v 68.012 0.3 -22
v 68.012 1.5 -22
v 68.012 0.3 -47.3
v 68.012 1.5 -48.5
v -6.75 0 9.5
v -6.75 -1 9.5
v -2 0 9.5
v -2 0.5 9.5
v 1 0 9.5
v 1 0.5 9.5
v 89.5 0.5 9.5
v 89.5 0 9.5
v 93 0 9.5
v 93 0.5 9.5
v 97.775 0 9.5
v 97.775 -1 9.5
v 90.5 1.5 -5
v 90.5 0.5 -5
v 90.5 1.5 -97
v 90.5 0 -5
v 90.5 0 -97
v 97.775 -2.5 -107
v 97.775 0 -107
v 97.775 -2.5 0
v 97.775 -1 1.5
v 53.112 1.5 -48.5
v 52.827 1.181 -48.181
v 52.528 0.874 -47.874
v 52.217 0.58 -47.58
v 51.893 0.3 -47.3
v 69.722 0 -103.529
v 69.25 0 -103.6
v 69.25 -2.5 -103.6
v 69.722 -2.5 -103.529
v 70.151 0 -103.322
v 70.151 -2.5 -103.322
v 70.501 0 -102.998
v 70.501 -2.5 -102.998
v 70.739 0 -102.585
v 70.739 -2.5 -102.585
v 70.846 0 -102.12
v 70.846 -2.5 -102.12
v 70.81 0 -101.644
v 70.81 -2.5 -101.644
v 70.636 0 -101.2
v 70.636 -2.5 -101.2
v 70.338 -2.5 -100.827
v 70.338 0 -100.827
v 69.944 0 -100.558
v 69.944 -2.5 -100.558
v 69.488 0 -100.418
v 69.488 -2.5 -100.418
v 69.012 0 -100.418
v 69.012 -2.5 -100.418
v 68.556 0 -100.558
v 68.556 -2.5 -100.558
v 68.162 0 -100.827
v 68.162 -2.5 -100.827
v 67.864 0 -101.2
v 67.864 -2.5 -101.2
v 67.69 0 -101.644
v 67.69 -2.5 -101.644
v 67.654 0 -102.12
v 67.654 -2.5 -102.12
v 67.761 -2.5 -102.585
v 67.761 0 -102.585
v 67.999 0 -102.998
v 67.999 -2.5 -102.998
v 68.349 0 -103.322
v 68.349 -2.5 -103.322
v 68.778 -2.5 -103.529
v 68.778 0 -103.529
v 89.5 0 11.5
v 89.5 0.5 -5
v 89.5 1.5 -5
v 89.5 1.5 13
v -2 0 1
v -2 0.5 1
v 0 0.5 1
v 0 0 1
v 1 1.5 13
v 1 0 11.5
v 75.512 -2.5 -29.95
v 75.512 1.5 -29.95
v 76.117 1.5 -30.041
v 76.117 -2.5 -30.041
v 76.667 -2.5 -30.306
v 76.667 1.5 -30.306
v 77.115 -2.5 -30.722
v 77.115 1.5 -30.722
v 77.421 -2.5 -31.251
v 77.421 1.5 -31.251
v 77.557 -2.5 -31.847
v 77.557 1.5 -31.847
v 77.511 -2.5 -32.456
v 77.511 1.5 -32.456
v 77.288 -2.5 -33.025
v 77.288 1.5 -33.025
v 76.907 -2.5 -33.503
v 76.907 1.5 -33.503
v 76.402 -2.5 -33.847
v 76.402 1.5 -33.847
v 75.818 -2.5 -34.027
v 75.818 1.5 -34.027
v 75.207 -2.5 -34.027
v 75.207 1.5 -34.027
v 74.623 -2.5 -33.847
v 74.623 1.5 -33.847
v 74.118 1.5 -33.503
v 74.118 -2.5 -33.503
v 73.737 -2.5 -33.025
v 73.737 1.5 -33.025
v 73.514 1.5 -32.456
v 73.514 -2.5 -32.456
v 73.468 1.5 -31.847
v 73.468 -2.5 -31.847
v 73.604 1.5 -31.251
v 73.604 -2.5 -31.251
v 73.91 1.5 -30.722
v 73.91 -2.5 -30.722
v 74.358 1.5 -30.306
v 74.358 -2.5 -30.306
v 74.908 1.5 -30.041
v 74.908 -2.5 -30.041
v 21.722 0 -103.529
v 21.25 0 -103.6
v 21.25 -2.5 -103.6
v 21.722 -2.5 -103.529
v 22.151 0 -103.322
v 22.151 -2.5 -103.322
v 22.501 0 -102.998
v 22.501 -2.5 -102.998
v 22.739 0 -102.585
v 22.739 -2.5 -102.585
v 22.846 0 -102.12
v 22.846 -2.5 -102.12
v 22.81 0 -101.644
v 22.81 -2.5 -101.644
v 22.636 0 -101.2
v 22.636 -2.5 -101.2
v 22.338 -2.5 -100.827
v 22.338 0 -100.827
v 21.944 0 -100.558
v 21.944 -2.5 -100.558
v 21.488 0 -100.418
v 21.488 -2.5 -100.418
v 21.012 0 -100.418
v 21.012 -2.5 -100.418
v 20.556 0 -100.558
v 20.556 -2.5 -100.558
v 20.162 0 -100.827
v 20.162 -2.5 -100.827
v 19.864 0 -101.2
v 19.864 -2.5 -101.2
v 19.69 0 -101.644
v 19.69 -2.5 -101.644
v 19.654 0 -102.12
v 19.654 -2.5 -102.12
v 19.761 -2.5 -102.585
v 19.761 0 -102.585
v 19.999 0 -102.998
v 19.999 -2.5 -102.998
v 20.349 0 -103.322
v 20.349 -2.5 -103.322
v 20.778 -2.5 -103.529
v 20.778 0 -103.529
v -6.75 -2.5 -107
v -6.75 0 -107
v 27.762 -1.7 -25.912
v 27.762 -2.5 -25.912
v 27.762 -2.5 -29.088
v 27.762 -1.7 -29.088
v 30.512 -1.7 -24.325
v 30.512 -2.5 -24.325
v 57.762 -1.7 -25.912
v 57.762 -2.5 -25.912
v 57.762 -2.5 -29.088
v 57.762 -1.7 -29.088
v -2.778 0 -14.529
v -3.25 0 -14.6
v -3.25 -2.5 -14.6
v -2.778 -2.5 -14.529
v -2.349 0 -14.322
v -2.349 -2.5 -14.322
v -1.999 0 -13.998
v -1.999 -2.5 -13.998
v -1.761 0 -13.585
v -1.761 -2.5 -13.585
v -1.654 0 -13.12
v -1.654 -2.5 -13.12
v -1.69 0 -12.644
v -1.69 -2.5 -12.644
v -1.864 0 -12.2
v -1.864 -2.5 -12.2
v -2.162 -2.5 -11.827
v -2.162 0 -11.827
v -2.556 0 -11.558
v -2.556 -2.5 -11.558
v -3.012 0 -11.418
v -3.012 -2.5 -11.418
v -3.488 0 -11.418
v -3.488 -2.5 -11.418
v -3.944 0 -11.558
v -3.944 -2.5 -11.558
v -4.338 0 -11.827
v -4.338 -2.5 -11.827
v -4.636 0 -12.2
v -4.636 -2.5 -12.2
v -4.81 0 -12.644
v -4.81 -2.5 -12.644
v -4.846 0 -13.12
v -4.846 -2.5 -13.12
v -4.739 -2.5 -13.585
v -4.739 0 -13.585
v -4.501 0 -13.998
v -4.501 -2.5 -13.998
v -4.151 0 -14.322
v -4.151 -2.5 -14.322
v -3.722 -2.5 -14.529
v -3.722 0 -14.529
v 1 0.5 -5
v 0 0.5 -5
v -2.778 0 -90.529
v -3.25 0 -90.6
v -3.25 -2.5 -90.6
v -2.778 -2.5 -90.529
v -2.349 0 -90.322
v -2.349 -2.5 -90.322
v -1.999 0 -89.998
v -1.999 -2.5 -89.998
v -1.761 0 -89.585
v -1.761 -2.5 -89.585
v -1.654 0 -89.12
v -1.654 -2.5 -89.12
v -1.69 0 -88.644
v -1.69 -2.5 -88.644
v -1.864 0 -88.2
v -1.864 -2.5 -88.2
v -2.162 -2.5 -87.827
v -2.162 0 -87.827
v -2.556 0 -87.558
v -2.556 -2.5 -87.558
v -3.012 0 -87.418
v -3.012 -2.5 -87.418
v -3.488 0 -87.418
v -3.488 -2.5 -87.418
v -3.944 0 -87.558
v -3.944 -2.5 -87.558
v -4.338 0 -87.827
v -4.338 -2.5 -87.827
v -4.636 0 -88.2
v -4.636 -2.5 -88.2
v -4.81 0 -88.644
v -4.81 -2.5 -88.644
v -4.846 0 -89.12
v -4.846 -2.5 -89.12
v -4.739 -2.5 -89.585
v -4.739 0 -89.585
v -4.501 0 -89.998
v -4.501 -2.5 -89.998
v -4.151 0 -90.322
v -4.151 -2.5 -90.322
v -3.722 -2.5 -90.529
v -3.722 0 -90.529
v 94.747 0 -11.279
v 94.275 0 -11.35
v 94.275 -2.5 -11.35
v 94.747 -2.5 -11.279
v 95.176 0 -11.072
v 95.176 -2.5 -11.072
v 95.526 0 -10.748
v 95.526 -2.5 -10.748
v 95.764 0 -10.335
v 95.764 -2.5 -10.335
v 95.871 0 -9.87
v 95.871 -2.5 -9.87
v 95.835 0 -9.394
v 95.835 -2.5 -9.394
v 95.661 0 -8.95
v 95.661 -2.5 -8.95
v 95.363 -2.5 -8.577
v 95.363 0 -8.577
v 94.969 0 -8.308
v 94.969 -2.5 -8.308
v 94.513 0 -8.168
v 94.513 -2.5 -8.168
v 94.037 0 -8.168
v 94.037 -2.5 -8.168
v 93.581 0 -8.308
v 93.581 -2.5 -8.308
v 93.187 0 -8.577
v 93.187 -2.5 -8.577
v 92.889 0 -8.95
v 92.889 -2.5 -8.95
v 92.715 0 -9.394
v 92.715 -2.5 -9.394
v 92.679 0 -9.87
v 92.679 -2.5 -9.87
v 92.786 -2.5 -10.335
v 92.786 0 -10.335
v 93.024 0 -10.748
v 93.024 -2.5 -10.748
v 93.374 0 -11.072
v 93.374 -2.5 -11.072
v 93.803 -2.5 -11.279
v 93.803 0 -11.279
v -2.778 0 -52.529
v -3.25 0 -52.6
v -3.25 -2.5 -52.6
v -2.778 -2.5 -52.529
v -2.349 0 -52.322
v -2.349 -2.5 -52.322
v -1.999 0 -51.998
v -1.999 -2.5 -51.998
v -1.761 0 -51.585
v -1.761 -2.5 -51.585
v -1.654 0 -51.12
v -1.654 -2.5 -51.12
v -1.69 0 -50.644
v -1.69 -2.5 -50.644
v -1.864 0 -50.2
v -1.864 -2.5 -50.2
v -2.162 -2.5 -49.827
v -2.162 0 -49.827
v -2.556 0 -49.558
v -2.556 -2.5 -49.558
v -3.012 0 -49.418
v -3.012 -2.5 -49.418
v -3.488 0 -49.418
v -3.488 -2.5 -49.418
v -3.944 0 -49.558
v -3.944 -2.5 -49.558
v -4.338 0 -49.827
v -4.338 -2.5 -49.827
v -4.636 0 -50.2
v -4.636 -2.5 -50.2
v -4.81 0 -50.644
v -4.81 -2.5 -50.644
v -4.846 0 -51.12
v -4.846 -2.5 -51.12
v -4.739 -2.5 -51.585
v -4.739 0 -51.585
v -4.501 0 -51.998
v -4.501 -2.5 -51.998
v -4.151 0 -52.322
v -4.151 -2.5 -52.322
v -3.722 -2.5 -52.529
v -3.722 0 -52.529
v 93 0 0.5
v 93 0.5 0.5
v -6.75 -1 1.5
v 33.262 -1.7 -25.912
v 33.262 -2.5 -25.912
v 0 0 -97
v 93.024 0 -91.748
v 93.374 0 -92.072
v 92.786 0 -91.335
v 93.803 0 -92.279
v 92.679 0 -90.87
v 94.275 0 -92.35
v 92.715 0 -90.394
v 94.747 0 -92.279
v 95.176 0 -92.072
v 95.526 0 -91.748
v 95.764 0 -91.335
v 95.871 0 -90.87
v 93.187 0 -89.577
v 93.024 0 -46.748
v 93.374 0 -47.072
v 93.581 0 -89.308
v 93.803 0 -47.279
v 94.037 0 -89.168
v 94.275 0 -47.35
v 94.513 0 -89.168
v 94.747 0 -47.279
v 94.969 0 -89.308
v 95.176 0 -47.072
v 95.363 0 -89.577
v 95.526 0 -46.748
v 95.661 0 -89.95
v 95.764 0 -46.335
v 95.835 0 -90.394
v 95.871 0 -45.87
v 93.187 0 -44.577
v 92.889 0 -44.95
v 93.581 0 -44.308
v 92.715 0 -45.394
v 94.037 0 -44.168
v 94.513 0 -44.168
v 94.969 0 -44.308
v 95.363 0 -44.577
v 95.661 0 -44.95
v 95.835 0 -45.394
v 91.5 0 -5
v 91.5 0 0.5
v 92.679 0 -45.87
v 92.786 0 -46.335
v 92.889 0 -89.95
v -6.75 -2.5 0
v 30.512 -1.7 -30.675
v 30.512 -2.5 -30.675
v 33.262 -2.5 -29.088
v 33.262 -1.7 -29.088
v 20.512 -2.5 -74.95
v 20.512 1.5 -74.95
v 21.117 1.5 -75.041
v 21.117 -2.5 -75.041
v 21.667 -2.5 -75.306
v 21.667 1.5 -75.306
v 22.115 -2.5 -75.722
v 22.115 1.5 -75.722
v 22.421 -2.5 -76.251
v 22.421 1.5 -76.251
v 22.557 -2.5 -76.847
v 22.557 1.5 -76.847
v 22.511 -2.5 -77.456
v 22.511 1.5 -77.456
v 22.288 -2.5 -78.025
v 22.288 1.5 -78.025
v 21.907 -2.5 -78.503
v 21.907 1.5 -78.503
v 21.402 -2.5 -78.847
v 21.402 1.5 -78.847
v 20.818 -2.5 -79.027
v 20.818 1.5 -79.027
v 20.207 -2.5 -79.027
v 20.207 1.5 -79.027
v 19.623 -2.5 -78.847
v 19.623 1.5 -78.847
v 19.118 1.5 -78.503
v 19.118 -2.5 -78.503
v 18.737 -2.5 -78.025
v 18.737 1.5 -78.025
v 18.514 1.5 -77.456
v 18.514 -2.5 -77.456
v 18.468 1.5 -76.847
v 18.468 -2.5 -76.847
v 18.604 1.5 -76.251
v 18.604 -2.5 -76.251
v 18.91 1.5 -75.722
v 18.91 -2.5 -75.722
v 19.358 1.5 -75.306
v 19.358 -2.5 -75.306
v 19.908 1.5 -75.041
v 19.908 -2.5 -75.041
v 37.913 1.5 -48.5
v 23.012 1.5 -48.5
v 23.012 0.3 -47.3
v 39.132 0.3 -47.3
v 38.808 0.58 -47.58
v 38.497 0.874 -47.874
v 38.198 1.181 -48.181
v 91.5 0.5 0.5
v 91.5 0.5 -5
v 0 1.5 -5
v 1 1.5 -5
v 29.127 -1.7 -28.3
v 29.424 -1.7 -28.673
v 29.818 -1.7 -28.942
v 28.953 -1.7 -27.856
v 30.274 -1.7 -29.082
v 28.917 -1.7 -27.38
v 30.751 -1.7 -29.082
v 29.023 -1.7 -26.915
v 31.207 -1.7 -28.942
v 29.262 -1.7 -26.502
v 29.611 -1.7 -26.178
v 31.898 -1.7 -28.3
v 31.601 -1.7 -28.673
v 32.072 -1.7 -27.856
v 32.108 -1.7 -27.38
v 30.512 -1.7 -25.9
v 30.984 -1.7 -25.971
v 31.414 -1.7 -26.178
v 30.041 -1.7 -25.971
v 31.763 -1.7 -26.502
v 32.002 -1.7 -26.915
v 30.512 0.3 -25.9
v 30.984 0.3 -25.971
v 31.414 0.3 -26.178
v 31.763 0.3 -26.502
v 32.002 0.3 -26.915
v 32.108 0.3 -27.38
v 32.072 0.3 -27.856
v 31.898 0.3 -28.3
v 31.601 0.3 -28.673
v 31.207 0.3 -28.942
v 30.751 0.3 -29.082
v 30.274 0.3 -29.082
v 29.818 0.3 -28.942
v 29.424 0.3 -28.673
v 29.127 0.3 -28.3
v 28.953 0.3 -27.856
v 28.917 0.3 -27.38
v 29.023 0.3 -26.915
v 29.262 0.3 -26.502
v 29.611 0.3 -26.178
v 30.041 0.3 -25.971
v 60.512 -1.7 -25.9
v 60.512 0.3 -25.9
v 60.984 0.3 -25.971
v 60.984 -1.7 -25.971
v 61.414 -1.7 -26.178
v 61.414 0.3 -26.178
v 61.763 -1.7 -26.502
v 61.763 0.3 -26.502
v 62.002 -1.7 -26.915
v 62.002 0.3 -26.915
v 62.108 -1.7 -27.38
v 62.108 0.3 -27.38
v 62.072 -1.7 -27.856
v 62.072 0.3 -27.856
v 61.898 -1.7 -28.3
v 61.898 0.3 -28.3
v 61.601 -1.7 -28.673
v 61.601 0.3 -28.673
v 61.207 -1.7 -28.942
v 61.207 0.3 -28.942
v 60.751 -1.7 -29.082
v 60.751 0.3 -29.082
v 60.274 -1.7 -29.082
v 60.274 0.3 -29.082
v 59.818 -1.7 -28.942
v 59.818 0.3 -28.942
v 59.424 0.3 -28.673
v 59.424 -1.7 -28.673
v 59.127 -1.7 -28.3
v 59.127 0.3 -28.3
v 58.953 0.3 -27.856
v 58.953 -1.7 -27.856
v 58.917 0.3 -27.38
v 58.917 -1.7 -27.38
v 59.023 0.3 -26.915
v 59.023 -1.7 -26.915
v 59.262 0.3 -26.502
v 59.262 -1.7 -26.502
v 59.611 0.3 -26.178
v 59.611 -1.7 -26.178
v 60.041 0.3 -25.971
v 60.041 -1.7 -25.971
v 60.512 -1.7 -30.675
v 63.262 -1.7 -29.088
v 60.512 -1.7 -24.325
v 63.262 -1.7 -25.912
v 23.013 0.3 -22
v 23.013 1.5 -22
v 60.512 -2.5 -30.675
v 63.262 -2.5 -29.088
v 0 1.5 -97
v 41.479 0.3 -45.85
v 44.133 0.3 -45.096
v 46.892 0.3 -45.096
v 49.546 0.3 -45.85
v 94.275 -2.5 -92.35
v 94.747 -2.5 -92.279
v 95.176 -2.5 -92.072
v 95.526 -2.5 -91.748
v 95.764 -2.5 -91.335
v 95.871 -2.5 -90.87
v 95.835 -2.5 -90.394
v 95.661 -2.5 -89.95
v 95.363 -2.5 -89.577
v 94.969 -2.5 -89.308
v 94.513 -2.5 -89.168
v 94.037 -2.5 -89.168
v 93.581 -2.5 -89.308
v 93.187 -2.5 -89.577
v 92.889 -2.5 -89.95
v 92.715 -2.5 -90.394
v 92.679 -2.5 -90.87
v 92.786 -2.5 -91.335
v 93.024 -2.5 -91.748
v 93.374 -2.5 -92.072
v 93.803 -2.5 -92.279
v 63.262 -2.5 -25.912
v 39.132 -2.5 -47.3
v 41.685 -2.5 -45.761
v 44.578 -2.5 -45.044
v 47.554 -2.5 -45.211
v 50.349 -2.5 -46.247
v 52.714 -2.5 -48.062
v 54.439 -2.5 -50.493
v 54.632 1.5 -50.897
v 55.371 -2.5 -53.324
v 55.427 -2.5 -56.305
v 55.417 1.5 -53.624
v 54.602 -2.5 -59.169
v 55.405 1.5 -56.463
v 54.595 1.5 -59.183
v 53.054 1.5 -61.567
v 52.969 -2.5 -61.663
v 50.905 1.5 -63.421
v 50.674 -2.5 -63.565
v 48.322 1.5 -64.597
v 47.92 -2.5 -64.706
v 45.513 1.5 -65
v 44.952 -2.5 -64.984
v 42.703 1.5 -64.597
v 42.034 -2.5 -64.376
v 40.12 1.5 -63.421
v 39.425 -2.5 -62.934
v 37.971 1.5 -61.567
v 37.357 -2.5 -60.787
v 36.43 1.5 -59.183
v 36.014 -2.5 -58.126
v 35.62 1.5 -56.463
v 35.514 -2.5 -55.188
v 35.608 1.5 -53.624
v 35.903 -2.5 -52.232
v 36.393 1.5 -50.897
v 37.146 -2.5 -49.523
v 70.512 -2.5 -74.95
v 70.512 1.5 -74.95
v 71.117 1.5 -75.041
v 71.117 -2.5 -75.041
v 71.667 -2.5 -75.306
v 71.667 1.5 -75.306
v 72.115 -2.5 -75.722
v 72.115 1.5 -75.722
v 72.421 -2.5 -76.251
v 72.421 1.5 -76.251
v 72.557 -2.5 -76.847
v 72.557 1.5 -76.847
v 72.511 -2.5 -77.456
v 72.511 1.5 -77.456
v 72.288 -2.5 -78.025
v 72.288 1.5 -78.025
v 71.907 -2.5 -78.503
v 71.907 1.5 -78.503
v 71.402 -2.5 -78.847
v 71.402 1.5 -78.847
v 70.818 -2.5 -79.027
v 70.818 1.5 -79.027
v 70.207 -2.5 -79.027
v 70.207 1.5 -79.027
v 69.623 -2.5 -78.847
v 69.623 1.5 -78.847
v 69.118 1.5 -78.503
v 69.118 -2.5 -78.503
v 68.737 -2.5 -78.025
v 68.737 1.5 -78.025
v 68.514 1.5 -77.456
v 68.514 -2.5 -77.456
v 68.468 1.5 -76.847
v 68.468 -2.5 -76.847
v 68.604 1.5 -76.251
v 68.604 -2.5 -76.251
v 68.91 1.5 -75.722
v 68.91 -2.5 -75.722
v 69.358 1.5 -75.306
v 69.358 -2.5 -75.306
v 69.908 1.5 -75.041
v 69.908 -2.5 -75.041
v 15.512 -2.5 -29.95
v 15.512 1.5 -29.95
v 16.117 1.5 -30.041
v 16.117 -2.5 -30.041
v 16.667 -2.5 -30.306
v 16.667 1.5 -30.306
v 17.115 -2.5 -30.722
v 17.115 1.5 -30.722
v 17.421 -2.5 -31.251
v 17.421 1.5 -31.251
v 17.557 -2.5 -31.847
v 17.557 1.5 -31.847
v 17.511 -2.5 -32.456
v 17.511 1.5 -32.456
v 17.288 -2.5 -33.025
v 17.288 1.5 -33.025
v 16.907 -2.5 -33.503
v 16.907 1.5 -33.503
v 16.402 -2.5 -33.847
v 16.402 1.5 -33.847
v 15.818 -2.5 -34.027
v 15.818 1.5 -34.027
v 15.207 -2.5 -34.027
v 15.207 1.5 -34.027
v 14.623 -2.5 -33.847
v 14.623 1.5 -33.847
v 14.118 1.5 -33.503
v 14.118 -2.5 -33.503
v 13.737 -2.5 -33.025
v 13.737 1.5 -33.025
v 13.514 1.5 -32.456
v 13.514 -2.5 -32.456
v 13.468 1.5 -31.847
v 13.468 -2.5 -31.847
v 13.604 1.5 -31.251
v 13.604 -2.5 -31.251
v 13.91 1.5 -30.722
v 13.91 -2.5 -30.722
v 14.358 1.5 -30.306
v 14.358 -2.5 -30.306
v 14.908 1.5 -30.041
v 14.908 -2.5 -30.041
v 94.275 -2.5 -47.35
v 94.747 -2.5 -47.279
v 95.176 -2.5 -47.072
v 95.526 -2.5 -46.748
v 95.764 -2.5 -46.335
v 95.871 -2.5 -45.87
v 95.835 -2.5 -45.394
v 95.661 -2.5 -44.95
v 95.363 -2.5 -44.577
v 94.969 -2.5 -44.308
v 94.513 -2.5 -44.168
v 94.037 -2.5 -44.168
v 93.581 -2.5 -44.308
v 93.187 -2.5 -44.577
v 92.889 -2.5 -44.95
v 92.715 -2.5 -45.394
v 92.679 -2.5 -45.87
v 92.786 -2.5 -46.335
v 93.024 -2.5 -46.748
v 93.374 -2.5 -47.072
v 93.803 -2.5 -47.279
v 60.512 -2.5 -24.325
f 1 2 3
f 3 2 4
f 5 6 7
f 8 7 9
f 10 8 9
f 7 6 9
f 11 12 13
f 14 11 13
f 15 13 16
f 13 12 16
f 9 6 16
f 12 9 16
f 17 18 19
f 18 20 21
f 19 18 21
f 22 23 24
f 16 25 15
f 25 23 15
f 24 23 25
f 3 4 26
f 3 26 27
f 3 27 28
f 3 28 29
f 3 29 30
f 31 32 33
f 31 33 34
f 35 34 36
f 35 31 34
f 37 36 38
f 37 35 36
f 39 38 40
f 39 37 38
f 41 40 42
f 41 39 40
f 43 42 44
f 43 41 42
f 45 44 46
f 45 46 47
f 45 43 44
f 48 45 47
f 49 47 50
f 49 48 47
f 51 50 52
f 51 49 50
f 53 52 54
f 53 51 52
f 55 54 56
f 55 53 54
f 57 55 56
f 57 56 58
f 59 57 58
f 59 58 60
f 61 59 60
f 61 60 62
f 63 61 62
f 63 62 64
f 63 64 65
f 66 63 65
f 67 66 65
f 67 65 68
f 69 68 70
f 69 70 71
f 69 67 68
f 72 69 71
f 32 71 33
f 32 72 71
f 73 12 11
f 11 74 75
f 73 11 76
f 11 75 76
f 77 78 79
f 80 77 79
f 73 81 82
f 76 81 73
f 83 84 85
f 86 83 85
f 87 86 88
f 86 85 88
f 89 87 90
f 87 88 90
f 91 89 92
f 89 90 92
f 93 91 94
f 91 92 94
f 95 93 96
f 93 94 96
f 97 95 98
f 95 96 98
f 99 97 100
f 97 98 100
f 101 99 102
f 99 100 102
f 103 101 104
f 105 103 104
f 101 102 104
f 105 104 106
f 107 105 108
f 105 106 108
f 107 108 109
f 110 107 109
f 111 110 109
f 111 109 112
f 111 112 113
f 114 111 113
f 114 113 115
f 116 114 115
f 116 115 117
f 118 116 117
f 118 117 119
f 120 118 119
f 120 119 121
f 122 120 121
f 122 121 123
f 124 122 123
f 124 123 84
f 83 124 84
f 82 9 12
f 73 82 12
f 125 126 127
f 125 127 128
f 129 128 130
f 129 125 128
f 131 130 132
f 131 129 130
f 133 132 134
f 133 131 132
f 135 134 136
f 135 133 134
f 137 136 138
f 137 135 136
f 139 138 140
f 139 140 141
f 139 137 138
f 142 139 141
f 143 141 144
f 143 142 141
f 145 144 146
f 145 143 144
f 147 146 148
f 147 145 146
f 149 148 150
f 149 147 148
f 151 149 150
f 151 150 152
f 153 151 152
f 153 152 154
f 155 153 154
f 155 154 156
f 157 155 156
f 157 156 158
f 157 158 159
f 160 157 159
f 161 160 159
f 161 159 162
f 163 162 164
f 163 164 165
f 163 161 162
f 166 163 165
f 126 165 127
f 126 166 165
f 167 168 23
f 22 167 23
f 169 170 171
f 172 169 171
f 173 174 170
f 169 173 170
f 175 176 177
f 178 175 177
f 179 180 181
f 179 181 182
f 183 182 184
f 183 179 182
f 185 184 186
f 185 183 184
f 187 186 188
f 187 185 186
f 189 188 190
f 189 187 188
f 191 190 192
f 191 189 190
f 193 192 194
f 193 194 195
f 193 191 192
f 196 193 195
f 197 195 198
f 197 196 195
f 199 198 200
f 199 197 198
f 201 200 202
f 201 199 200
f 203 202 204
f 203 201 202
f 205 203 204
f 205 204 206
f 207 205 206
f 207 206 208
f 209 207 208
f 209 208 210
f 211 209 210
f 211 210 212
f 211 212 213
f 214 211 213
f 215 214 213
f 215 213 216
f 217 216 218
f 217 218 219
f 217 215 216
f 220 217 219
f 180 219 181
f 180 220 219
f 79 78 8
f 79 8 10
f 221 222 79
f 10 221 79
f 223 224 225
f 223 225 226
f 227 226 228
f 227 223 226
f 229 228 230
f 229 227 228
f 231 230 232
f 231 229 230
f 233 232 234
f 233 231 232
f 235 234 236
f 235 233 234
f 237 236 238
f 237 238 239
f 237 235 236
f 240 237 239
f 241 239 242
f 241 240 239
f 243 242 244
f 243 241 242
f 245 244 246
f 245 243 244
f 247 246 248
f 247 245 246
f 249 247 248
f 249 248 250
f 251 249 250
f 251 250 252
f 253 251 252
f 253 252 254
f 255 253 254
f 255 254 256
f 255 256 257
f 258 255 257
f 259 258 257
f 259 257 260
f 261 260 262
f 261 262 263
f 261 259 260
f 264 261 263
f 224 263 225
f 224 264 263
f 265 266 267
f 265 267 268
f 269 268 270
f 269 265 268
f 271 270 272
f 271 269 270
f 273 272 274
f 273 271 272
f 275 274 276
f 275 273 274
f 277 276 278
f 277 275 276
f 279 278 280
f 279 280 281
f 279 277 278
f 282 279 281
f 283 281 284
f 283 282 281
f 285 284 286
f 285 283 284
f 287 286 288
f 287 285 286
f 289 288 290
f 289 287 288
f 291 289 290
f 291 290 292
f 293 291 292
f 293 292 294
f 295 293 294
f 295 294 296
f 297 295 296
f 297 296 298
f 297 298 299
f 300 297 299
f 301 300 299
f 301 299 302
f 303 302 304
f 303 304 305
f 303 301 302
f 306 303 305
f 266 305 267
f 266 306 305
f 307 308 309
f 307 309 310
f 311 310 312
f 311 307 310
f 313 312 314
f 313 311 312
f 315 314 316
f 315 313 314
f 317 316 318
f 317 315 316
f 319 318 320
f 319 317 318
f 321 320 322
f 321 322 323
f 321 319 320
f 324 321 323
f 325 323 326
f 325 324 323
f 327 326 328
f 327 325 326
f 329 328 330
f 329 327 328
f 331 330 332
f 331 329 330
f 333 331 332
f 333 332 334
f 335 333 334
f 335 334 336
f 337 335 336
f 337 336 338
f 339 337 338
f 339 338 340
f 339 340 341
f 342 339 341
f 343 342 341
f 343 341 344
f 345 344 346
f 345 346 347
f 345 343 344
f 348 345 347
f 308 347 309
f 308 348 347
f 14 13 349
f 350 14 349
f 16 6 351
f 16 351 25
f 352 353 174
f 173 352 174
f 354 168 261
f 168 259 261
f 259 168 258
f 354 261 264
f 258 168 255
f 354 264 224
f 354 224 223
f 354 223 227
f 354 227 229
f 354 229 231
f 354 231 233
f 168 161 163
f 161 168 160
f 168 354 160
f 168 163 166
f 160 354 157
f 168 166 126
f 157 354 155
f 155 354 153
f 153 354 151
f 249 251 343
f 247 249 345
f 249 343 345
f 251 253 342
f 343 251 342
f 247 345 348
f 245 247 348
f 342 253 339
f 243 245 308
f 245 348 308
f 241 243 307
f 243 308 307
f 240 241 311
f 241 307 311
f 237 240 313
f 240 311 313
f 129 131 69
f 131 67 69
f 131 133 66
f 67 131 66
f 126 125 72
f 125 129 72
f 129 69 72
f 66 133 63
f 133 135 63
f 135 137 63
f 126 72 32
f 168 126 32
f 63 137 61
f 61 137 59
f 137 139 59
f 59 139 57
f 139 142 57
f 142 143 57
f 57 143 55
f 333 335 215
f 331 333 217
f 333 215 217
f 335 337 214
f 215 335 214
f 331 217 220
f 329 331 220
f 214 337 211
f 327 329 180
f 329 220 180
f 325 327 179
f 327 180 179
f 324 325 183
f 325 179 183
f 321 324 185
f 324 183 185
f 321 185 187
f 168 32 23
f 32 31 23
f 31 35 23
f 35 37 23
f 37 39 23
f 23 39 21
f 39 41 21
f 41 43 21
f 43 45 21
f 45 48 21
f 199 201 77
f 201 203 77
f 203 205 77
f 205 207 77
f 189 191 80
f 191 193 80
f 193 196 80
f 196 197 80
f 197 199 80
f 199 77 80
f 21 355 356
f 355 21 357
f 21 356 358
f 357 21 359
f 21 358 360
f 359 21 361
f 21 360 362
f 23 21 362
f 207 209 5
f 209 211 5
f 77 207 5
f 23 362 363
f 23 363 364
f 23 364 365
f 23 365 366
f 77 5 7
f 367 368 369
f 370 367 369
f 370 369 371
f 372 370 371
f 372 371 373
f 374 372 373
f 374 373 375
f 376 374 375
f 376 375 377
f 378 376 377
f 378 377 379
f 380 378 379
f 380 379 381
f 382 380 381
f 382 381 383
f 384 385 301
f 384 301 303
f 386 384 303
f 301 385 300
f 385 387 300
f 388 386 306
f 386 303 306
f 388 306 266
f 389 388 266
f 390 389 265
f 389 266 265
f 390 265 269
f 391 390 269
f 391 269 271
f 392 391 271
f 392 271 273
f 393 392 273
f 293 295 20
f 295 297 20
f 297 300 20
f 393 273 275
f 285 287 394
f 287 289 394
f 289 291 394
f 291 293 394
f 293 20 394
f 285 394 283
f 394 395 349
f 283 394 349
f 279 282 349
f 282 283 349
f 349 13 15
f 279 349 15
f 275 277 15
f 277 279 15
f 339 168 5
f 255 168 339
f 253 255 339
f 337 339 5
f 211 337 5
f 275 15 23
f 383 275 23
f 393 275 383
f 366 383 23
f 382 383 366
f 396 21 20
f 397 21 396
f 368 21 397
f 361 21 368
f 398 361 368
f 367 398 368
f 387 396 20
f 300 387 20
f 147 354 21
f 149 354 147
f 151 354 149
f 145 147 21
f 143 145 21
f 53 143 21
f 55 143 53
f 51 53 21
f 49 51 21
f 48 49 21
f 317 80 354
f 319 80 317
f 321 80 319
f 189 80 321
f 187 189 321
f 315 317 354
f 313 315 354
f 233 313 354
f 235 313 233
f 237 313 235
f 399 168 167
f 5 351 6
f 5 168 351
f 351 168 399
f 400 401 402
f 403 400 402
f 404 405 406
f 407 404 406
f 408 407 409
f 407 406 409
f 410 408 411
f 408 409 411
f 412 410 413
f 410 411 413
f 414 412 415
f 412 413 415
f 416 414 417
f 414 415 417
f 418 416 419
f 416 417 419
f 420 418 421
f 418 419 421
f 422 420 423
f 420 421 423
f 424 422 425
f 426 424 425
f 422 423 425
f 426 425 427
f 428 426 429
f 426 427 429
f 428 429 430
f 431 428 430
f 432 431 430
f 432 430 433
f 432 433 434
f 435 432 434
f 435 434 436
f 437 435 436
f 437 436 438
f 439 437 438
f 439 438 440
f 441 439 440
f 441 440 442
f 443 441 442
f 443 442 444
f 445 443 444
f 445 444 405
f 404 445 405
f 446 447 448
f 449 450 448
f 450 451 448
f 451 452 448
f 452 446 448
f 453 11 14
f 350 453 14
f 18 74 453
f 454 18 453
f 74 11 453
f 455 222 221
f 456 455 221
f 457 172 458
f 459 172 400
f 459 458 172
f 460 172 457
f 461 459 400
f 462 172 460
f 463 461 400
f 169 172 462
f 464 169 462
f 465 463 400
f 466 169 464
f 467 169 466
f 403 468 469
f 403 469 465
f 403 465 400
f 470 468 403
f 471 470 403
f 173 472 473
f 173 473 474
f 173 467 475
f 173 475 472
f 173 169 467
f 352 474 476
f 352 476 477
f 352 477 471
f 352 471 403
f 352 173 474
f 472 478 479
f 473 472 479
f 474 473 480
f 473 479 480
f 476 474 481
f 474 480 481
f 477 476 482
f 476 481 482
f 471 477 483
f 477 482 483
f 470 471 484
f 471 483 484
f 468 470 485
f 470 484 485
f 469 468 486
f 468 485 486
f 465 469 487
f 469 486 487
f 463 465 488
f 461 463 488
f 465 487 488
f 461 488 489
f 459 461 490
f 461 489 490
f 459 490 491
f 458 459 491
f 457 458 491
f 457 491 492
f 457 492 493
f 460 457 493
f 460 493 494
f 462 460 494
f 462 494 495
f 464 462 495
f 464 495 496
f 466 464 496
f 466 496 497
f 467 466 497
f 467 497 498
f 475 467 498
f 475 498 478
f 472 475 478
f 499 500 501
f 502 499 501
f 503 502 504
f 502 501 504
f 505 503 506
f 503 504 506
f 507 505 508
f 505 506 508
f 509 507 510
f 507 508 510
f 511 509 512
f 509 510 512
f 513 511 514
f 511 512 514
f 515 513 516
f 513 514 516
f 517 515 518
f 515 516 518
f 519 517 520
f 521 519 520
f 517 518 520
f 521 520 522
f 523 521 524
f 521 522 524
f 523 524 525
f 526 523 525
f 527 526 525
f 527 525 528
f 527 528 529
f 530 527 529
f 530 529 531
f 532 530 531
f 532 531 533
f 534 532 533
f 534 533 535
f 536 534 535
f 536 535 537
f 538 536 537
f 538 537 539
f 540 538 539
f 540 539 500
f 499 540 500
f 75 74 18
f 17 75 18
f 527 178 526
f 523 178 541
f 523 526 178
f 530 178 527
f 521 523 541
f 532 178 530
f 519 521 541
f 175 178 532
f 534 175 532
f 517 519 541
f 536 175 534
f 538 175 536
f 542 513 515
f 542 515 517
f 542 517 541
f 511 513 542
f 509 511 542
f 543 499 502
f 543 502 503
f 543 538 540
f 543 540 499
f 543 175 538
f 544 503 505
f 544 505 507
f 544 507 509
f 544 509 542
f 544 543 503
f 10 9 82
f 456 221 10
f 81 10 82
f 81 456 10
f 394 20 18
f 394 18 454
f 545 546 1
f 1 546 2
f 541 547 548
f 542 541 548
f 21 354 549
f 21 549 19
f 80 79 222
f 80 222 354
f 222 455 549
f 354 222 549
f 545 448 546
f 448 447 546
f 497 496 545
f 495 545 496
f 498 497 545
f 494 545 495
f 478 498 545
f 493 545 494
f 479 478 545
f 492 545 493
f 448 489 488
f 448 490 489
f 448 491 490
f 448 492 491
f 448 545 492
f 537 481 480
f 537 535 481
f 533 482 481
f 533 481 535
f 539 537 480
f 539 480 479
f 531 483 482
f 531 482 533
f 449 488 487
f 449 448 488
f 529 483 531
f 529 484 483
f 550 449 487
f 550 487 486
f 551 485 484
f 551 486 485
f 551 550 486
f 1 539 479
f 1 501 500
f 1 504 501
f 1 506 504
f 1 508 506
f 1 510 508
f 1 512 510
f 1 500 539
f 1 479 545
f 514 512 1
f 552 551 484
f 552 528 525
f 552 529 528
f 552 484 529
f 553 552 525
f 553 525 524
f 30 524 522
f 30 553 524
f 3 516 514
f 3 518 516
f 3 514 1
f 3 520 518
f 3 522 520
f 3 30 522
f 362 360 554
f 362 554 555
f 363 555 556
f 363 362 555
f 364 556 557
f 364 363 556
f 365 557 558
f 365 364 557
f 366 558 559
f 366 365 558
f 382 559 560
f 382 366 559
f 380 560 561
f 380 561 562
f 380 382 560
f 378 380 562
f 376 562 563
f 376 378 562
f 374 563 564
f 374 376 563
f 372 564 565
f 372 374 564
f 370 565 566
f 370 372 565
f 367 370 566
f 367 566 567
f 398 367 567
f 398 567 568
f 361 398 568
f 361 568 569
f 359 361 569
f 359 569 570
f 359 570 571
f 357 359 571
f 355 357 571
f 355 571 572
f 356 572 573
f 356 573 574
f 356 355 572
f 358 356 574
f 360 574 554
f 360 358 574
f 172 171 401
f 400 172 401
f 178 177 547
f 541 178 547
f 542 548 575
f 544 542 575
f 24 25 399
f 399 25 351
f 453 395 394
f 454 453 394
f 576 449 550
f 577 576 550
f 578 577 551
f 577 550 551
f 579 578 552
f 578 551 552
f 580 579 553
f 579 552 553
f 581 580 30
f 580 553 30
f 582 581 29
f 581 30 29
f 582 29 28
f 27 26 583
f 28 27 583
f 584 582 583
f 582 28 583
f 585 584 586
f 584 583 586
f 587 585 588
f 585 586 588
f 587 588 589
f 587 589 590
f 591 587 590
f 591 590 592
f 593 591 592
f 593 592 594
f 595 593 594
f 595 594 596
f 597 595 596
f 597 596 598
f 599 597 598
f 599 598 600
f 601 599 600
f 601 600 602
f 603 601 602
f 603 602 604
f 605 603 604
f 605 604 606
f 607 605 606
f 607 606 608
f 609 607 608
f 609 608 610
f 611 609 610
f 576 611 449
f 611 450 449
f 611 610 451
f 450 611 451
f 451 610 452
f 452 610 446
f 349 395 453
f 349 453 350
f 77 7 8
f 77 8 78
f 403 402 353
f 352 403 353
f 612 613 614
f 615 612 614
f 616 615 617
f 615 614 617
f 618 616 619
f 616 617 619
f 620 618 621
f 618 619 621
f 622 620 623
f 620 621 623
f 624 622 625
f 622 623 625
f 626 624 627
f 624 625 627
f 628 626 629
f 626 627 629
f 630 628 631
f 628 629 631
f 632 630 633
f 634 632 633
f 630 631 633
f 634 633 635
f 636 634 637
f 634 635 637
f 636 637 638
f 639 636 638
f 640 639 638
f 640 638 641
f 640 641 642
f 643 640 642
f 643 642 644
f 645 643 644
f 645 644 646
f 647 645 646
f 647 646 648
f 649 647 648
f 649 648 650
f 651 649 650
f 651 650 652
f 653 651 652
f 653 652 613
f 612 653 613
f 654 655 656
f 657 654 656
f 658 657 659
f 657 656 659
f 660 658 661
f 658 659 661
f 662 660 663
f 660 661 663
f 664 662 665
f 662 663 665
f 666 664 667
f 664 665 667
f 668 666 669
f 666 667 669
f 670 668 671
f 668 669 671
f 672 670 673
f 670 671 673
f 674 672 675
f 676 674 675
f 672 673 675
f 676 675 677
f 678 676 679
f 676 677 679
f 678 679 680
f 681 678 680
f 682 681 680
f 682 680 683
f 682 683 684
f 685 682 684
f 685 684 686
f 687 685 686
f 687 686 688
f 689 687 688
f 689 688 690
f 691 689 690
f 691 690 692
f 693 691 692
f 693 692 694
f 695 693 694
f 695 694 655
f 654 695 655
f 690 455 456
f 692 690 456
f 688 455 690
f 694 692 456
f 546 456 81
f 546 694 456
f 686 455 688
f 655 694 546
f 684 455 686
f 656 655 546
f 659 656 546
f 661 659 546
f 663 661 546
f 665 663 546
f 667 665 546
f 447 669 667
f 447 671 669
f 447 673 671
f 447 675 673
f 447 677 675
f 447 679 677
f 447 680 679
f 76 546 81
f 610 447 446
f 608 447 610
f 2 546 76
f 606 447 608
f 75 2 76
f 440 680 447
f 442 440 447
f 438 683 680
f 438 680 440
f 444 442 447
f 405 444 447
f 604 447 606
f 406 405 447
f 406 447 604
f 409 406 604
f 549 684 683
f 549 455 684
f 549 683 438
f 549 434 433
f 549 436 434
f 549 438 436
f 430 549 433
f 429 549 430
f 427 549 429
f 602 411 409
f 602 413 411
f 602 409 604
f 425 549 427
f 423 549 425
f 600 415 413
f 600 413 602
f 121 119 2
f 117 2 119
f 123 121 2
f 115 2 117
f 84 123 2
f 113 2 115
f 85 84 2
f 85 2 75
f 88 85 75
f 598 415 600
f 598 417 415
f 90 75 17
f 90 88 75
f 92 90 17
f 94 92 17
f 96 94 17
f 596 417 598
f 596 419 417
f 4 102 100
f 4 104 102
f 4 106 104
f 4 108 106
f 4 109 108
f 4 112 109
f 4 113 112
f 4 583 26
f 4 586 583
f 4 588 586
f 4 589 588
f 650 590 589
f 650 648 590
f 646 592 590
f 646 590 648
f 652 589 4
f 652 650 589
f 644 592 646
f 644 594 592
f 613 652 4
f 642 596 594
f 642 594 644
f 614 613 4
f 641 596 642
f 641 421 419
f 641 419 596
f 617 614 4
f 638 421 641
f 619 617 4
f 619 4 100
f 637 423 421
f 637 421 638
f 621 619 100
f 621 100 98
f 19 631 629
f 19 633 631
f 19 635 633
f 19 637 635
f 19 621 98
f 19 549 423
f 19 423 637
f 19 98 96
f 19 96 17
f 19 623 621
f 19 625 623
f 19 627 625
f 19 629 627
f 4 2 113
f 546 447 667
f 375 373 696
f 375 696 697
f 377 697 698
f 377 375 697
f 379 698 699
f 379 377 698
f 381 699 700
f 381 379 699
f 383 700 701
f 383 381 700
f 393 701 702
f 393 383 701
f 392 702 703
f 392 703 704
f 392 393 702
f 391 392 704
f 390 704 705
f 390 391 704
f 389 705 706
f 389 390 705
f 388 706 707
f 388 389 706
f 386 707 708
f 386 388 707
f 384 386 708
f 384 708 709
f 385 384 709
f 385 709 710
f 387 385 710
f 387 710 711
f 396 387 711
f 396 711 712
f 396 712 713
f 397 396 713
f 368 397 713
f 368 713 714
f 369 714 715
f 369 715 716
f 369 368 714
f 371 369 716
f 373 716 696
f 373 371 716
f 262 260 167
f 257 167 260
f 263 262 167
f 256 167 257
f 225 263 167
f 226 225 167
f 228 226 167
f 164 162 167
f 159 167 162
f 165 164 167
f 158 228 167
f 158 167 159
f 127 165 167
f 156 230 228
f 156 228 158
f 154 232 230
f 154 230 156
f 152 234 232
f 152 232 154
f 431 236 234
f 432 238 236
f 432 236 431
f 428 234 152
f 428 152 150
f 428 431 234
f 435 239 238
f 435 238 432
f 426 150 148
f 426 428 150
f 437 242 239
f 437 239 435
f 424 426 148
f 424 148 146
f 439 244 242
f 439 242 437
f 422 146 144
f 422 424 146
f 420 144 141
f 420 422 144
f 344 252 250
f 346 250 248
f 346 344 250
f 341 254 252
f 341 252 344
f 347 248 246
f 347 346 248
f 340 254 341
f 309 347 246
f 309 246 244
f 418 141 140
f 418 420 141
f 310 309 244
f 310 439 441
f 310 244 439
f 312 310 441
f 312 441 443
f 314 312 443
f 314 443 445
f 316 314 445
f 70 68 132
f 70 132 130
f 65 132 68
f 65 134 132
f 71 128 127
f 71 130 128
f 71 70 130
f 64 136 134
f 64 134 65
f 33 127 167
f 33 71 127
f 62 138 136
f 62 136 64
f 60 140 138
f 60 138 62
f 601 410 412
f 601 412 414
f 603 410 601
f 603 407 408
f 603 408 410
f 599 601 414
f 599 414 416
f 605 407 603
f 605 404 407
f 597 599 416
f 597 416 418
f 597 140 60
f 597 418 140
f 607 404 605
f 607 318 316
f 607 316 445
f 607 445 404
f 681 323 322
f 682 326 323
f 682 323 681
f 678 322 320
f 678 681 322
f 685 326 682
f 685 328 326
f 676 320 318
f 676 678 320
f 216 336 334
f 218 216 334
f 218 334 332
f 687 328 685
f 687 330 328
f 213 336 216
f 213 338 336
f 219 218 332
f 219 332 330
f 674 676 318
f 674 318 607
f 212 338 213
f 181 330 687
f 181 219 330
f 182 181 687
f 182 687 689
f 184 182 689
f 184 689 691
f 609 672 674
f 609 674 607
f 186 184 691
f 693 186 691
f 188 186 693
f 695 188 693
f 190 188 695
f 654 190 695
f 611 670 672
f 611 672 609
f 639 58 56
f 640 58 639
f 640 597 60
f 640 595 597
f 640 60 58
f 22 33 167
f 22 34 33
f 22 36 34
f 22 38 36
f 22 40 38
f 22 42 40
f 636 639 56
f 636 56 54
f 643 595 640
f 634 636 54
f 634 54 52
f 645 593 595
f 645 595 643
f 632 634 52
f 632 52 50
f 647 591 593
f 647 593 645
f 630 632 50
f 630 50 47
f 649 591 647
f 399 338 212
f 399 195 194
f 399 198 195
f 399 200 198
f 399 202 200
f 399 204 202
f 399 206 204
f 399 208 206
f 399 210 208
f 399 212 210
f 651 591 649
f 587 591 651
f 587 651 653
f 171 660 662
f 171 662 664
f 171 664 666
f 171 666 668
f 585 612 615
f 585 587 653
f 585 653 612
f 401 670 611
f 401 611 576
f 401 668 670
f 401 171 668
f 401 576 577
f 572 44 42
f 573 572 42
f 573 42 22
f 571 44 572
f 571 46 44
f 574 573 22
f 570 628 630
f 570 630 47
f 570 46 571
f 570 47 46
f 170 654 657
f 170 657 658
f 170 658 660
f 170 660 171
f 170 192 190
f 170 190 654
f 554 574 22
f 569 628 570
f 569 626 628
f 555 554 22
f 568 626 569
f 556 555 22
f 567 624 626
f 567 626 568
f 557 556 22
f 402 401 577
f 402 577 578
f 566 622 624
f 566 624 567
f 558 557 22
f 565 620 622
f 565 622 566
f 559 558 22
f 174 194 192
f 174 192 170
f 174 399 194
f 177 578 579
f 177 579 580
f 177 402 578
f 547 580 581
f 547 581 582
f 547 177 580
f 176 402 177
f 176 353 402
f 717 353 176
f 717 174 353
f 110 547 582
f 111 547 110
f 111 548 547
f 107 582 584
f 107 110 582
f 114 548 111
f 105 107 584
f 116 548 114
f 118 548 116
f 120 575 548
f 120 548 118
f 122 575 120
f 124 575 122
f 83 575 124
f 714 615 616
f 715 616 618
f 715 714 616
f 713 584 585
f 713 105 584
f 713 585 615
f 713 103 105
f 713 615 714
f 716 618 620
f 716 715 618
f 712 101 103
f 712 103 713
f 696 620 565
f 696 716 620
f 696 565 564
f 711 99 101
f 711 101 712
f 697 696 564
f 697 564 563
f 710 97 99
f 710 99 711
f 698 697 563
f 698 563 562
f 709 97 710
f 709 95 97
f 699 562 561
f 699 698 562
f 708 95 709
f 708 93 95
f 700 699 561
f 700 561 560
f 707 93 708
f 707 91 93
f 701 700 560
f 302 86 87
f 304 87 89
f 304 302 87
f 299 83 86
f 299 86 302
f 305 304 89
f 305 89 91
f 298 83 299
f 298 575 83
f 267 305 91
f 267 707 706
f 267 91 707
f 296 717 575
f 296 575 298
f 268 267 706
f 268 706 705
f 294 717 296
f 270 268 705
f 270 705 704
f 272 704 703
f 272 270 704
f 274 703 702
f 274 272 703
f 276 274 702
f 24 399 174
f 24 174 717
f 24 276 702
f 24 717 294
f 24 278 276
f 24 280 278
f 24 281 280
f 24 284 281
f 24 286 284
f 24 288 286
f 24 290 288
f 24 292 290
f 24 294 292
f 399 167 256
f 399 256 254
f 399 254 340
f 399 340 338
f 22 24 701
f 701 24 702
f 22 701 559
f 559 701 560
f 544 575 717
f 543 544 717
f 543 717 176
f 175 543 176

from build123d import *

# Parameters (mm, degrees)
SKETCH_1_W           = 90.5
SKETCH_1_H           = 97
EXTRUDE_1_DEPTH      = 2
SKETCH_2_W           = 104.525
SKETCH_2_H           = 124
SKETCH_2_R           = 1.6
EXTRUDE_2_DEPTH      = 2.5
SKETCH_3_W           = 88.5
SKETCH_3_H           = 17
EXTRUDE_3_DEPTH      = 2
SKETCH_4_W           = 1
SKETCH_4_H           = 5
CUT_EXTRUDE_1_DEPTH  = 2
CUT_EXTRUDE_2_DEPTH  = 150.601890446
SKETCH_6_W           = 45
SKETCH_6_H           = 25
CUT_EXTRUDE_3_DEPTH  = 1.7
CUT_EXTRUDE_4_REACH  = 146.972
SKETCH_7_R           = 1.6
CHAMFER_1_SIZE       = 2
CUT_EXTRUDE_5_REACH  = 147.014
SKETCH_8_R           = 2.05
CUT_EXTRUDE_6_REACH  = 147.014
SKETCH_9_R           = 10
CUT_EXTRUDE_7_DEPTH  = 0.8
CUT_EXTRUDE_8_REACH  = 151.602
SKETCH_11_W          = 6.5
SKETCH_11_H          = 2.5
CHAMFER_2_SIZE       = 2
SKETCH_12_W          = 104.525
SKETCH_12_H          = 9.5
EXTRUDE_4_DEPTH      = 1
SKETCH_13_W          = 2
SKETCH_13_H          = 14.5
EXTRUDE_5_DEPTH      = 0.5
SKETCH_14_W          = 1.5
SKETCH_14_H          = 9
SKETCH_14_W_2        = 1
EXTRUDE_6_DEPTH      = 0.5
SKETCH_15_W          = 88.5
SKETCH_15_H          = 2.828427125
EXTRUDE_7_DEPTH      = 2
CUT_EXTRUDE_9_DEPTH  = 0.5
SKETCH_17_W          = 2
SKETCH_17_H          = 6
CUT_EXTRUDE_10_DEPTH = 0.5


with BuildPart() as part:
    # 草图1 → 凸台-拉伸1 (new body)
    with BuildSketch(Plane(origin=(0, 0, 0), x_dir=(1, 0, 0), z_dir=(0, 1, 0))):
        with Locations((45.25, 48.5)):
            Rectangle(SKETCH_1_W, SKETCH_1_H)
    extrude(amount=EXTRUDE_1_DEPTH)

    # 草图2 → 凸台-拉伸2 (add)
    with BuildSketch(Plane.XZ):
        with Locations((45.5125, -45)):
            Rectangle(SKETCH_2_W, SKETCH_2_H)
        with Locations(Location((21.25, -102, 0), (0, 0, 270))):
            Circle(SKETCH_2_R, mode=Mode.SUBTRACT)
        with Locations(Location((69.25, -102, 0), (0, 0, 270))):
            Circle(SKETCH_2_R, mode=Mode.SUBTRACT)
        with Locations(Location((-3.25, -89, 0), (0, 0, 270))):
            Circle(SKETCH_2_R, mode=Mode.SUBTRACT)
        with Locations(Location((94.275, -90.75, 0), (0, 0, 270))):
            Circle(SKETCH_2_R, mode=Mode.SUBTRACT)
        with Locations(Location((-3.25, -13, 0), (0, 0, 270))):
            Circle(SKETCH_2_R, mode=Mode.SUBTRACT)
        with Locations(Location((-3.25, -51, 0), (0, 0, 270))):
            Circle(SKETCH_2_R, mode=Mode.SUBTRACT)
        with Locations(Location((94.275, -9.75, 0), (0, 0, 270))):
            Circle(SKETCH_2_R, mode=Mode.SUBTRACT)
        with Locations(Location((94.275, -45.75, 0), (0, 0, 270))):
            Circle(SKETCH_2_R, mode=Mode.SUBTRACT)
    extrude(amount=EXTRUDE_2_DEPTH)

    # 草图3 → 凸台-拉伸3 (add)
    with BuildSketch(Plane(origin=(0, 0, 0), x_dir=(1, 0, 0), z_dir=(0, 1, 0))):
        with Locations((45.25, -8.5)):
            Rectangle(SKETCH_3_W, SKETCH_3_H)
    extrude(amount=EXTRUDE_3_DEPTH)

    # 草图4 → 切除-拉伸1 (cut)
    with BuildSketch(Plane(origin=(0, 0, 0), x_dir=(1, 0, 0), z_dir=(0, 1, 0))):
        with Locations((0.5, 2.5)):
            Rectangle(SKETCH_4_W, SKETCH_4_H)
        with Locations((90, 2.5)):
            Rectangle(SKETCH_4_W, SKETCH_4_H)
    extrude(amount=CUT_EXTRUDE_1_DEPTH, mode=Mode.SUBTRACT)

    # 草图5 → 切除-拉伸2 (cut, through all)
    with BuildSketch(Plane(origin=(97.775, 0, 0), x_dir=(0, 0, -1), z_dir=(1, 0, 0))):
        Polygon((-8.5, -2.5), (-8.5, 0), (-9.5, 0), (-11.5, 2), (-17, 2), (-17, -2.5), align=None)
    extrude(amount=-CUT_EXTRUDE_2_DEPTH, mode=Mode.SUBTRACT)

    # 草图6 → 切除-拉伸3 (cut)
    with BuildSketch(Plane(origin=(0, 2, 0), x_dir=(1, 0, 0), z_dir=(0, 1, 0))):
        with Locations((45.5125, 34.5)):
            Rectangle(SKETCH_6_W, SKETCH_6_H)
    extrude(amount=-CUT_EXTRUDE_3_DEPTH, mode=Mode.SUBTRACT)

    # 草图7 → 切除-拉伸4 (cut, up to next)
    with BuildSketch(Plane(origin=(0, 0.3, 0), x_dir=(1, 0, 0), z_dir=(0, 1, 0)), mode=Mode.PRIVATE) as cut_extrude_4_sk1:
        with Locations(Location((30.5125, 27.5, 0), (0, 0, 270))):
            Circle(SKETCH_7_R)
    cut_extrude_4_tool1 = extrude(cut_extrude_4_sk1.sketch, amount=-CUT_EXTRUDE_4_REACH, mode=Mode.PRIVATE) & part.part
    # 草图7 → 切除-拉伸4 (cut, up to next)
    with BuildSketch(Plane(origin=(0, 0.3, 0), x_dir=(1, 0, 0), z_dir=(0, 1, 0)), mode=Mode.PRIVATE) as cut_extrude_4_sk2:
        with Locations(Location((60.5125, 27.5, 0), (0, 0, 270))):
            Circle(SKETCH_7_R)
    cut_extrude_4_tool2 = extrude(cut_extrude_4_sk2.sketch, amount=-CUT_EXTRUDE_4_REACH, mode=Mode.PRIVATE) & part.part
    add(cut_extrude_4_tool1.solids().sort_by_distance((30.5125, 0.3, -27.5))[0], mode=Mode.SUBTRACT)
    add(cut_extrude_4_tool2.solids().sort_by_distance((60.5125, 0.3, -27.5))[0], mode=Mode.SUBTRACT)

    # 倒角1
    # the kernel refuses this chamfer: 2 mm, written as the material it adds along each edge
    # the kernel refuses this chamfer: 2 mm, written as the material it takes off along each edge
    with BuildSketch(Plane(origin=(23.0125, 2, -47), x_dir=(0, 0.027495876610586296, -0.9996219169112968), z_dir=(1, 0, 0))) as chamfer_1_2_piece_1_section:
        Polygon((CHAMFER_1_SIZE * 0.999621916911, -CHAMFER_1_SIZE * 0.0274958766106), (-CHAMFER_1_SIZE * 0.0274958766106, -CHAMFER_1_SIZE * 0.999621916911), (0, 0), align=None)
    chamfer_1_2_piece_1 = extrude(amount=45, mode=Mode.PRIVATE)
    chamfer_1_2_piece_1 = split(chamfer_1_2_piece_1, bisect_by=Plane(origin=(45.5125, 0.3, -47.679710145), z_dir=(0, 1, 0)), keep=Keep.TOP, mode=Mode.PRIVATE)
    add(chamfer_1_2_piece_1, mode=Mode.SUBTRACT)

    # 草图8 → 切除-拉伸5 (cut, up to next)
    with BuildSketch(Plane(origin=(0, 2, 0), x_dir=(1, 0, 0), z_dir=(0, 1, 0)), mode=Mode.PRIVATE) as cut_extrude_5_sk1:
        with Locations(Location((20.5125, 77, 0), (0, 0, 270))):
            Circle(SKETCH_8_R)
    cut_extrude_5_tool1 = extrude(cut_extrude_5_sk1.sketch, amount=-CUT_EXTRUDE_5_REACH, mode=Mode.PRIVATE) & part.part
    # 草图8 → 切除-拉伸5 (cut, up to next)
    with BuildSketch(Plane(origin=(0, 2, 0), x_dir=(1, 0, 0), z_dir=(0, 1, 0)), mode=Mode.PRIVATE) as cut_extrude_5_sk2:
        with Locations(Location((70.5125, 77, 0), (0, 0, 270))):
            Circle(SKETCH_8_R)
    cut_extrude_5_tool2 = extrude(cut_extrude_5_sk2.sketch, amount=-CUT_EXTRUDE_5_REACH, mode=Mode.PRIVATE) & part.part
    # 草图8 → 切除-拉伸5 (cut, up to next)
    with BuildSketch(Plane(origin=(0, 2, 0), x_dir=(1, 0, 0), z_dir=(0, 1, 0)), mode=Mode.PRIVATE) as cut_extrude_5_sk3:
        with Locations(Location((15.5125, 32, 0), (0, 0, 270))):
            Circle(SKETCH_8_R)
    cut_extrude_5_tool3 = extrude(cut_extrude_5_sk3.sketch, amount=-CUT_EXTRUDE_5_REACH, mode=Mode.PRIVATE) & part.part
    # 草图8 → 切除-拉伸5 (cut, up to next)
    with BuildSketch(Plane(origin=(0, 2, 0), x_dir=(1, 0, 0), z_dir=(0, 1, 0)), mode=Mode.PRIVATE) as cut_extrude_5_sk4:
        with Locations(Location((75.5125, 32, 0), (0, 0, 270))):
            Circle(SKETCH_8_R)
    cut_extrude_5_tool4 = extrude(cut_extrude_5_sk4.sketch, amount=-CUT_EXTRUDE_5_REACH, mode=Mode.PRIVATE) & part.part
    add(cut_extrude_5_tool1.solids().sort_by_distance((20.5125, 2, -77))[0], mode=Mode.SUBTRACT)
    add(cut_extrude_5_tool2.solids().sort_by_distance((70.5125, 2, -77))[0], mode=Mode.SUBTRACT)
    add(cut_extrude_5_tool3.solids().sort_by_distance((15.5125, 2, -32))[0], mode=Mode.SUBTRACT)
    add(cut_extrude_5_tool4.solids().sort_by_distance((75.5125, 2, -32))[0], mode=Mode.SUBTRACT)

    # 草图9 → 切除-拉伸6 (cut, up to next)
    with BuildSketch(Plane(origin=(0, 2, 0), x_dir=(1, 0, 0), z_dir=(0, 1, 0)), mode=Mode.PRIVATE) as cut_extrude_6_sk1:
        with Locations(Location((45.5125, 55, 0), (0, 0, 230.353888853))):
            Circle(SKETCH_9_R)
    cut_extrude_6_tool1 = extrude(cut_extrude_6_sk1.sketch, amount=-CUT_EXTRUDE_6_REACH, mode=Mode.PRIVATE) & part.part
    add(cut_extrude_6_tool1.solids().sort_by_distance((45.5125, 2, -55))[0], mode=Mode.SUBTRACT)

    # 草图10 → 切除-拉伸7 (cut)
    with BuildSketch(Plane.XZ.offset(2.5)):
        Polygon((27.7625, -25.91228676), (27.7625, -29.08771324), (30.5125, -30.675426481), (33.2625, -29.08771324), (33.2625, -25.91228676), (30.5125, -24.324573519), align=None)
        Polygon((57.7625, -25.91228676), (57.7625, -29.08771324), (60.5125, -30.675426481), (63.2625, -29.08771324), (63.2625, -25.91228676), (60.5125, -24.324573519), align=None)
    extrude(amount=-CUT_EXTRUDE_7_DEPTH, mode=Mode.SUBTRACT)

    # 草图11 → 切除-拉伸8 (cut, up to next)
    with BuildSketch(Plane(origin=(97.775, 0, 0), x_dir=(0, 0, -1), z_dir=(1, 0, 0)), mode=Mode.PRIVATE) as cut_extrude_8_sk1:
        with Locations((-5.25, -1.25)):
            Rectangle(SKETCH_11_W, SKETCH_11_H)
    cut_extrude_8_tool1 = extrude(cut_extrude_8_sk1.sketch, amount=-CUT_EXTRUDE_8_REACH, mode=Mode.PRIVATE) & part.part
    add(cut_extrude_8_tool1.solids().sort_by_distance((97.775, -1.25, 5.25))[0], mode=Mode.SUBTRACT)

    # 倒角2
    chamfer_2_edges = [part.edges().sort_by_distance(p)[0] for p in [
        (45.5125, -2.5, 2),
    ]]
    chamfer(chamfer_2_edges, length=CHAMFER_2_SIZE)

    # 草图12 → 凸台-拉伸4 (add)
    with BuildSketch(Plane.XZ):
        with Locations((45.5125, 4.75)):
            Rectangle(SKETCH_12_W, SKETCH_12_H)
    extrude(amount=EXTRUDE_4_DEPTH)

    # 草图13 → 凸台-拉伸5 (add)
    with BuildSketch(Plane(origin=(0, 0, 0), x_dir=(1, 0, 0), z_dir=(0, 1, 0))):
        with Locations((0, -2.25)):
            Rectangle(SKETCH_13_W, SKETCH_13_H)
        with Locations((90.5, -2.25)):
            Rectangle(SKETCH_13_W, SKETCH_13_H)
    extrude(amount=EXTRUDE_5_DEPTH)

    # 草图14 → 凸台-拉伸6 (add)
    with BuildSketch(Plane(origin=(0, 0, 0), x_dir=(1, 0, 0), z_dir=(0, 1, 0))):
        with Locations((92.25, -5)):
            Rectangle(SKETCH_14_W, SKETCH_14_H)
        with Locations((-1.5, -5)):
            Rectangle(SKETCH_14_W_2, SKETCH_14_H)
    extrude(amount=EXTRUDE_6_DEPTH)

    # 草图15 → 凸台-拉伸7 (add, along a direction that is not the sketch's normal)
    with BuildSketch(Plane(origin=(0, -4.75, 4.75), x_dir=(1, 0, 0), z_dir=(0, -0.7071067811865501, 0.7071067811865449))):
        with Locations((45.25, 8.131727983)):
            Rectangle(SKETCH_15_W, SKETCH_15_H)
    extrude(amount=EXTRUDE_7_DEPTH, dir=(0, 0, 1))

    # 草图16 → 切除-拉伸9 (cut)
    with BuildSketch(Plane(origin=(0, 2, 0), x_dir=(1, 0, 0), z_dir=(0, 1, 0))):
        Polygon((1, 5), (1, -13.5), (89.5, -13.5), (89.5, 5), (90.5, 5), (90.5, 97), (0, 97), (0, 5), align=None)
    extrude(amount=-CUT_EXTRUDE_9_DEPTH, mode=Mode.SUBTRACT)

    # 草图17 → 切除-拉伸10 (cut)
    with BuildSketch(Plane(origin=(0, 0.5, 0), x_dir=(1, 0, 0), z_dir=(0, 1, 0))):
        with Locations((-1, 2)):
            Rectangle(SKETCH_17_W, SKETCH_17_H)
    extrude(amount=-CUT_EXTRUDE_10_DEPTH, mode=Mode.SUBTRACT)


solid = part.part
